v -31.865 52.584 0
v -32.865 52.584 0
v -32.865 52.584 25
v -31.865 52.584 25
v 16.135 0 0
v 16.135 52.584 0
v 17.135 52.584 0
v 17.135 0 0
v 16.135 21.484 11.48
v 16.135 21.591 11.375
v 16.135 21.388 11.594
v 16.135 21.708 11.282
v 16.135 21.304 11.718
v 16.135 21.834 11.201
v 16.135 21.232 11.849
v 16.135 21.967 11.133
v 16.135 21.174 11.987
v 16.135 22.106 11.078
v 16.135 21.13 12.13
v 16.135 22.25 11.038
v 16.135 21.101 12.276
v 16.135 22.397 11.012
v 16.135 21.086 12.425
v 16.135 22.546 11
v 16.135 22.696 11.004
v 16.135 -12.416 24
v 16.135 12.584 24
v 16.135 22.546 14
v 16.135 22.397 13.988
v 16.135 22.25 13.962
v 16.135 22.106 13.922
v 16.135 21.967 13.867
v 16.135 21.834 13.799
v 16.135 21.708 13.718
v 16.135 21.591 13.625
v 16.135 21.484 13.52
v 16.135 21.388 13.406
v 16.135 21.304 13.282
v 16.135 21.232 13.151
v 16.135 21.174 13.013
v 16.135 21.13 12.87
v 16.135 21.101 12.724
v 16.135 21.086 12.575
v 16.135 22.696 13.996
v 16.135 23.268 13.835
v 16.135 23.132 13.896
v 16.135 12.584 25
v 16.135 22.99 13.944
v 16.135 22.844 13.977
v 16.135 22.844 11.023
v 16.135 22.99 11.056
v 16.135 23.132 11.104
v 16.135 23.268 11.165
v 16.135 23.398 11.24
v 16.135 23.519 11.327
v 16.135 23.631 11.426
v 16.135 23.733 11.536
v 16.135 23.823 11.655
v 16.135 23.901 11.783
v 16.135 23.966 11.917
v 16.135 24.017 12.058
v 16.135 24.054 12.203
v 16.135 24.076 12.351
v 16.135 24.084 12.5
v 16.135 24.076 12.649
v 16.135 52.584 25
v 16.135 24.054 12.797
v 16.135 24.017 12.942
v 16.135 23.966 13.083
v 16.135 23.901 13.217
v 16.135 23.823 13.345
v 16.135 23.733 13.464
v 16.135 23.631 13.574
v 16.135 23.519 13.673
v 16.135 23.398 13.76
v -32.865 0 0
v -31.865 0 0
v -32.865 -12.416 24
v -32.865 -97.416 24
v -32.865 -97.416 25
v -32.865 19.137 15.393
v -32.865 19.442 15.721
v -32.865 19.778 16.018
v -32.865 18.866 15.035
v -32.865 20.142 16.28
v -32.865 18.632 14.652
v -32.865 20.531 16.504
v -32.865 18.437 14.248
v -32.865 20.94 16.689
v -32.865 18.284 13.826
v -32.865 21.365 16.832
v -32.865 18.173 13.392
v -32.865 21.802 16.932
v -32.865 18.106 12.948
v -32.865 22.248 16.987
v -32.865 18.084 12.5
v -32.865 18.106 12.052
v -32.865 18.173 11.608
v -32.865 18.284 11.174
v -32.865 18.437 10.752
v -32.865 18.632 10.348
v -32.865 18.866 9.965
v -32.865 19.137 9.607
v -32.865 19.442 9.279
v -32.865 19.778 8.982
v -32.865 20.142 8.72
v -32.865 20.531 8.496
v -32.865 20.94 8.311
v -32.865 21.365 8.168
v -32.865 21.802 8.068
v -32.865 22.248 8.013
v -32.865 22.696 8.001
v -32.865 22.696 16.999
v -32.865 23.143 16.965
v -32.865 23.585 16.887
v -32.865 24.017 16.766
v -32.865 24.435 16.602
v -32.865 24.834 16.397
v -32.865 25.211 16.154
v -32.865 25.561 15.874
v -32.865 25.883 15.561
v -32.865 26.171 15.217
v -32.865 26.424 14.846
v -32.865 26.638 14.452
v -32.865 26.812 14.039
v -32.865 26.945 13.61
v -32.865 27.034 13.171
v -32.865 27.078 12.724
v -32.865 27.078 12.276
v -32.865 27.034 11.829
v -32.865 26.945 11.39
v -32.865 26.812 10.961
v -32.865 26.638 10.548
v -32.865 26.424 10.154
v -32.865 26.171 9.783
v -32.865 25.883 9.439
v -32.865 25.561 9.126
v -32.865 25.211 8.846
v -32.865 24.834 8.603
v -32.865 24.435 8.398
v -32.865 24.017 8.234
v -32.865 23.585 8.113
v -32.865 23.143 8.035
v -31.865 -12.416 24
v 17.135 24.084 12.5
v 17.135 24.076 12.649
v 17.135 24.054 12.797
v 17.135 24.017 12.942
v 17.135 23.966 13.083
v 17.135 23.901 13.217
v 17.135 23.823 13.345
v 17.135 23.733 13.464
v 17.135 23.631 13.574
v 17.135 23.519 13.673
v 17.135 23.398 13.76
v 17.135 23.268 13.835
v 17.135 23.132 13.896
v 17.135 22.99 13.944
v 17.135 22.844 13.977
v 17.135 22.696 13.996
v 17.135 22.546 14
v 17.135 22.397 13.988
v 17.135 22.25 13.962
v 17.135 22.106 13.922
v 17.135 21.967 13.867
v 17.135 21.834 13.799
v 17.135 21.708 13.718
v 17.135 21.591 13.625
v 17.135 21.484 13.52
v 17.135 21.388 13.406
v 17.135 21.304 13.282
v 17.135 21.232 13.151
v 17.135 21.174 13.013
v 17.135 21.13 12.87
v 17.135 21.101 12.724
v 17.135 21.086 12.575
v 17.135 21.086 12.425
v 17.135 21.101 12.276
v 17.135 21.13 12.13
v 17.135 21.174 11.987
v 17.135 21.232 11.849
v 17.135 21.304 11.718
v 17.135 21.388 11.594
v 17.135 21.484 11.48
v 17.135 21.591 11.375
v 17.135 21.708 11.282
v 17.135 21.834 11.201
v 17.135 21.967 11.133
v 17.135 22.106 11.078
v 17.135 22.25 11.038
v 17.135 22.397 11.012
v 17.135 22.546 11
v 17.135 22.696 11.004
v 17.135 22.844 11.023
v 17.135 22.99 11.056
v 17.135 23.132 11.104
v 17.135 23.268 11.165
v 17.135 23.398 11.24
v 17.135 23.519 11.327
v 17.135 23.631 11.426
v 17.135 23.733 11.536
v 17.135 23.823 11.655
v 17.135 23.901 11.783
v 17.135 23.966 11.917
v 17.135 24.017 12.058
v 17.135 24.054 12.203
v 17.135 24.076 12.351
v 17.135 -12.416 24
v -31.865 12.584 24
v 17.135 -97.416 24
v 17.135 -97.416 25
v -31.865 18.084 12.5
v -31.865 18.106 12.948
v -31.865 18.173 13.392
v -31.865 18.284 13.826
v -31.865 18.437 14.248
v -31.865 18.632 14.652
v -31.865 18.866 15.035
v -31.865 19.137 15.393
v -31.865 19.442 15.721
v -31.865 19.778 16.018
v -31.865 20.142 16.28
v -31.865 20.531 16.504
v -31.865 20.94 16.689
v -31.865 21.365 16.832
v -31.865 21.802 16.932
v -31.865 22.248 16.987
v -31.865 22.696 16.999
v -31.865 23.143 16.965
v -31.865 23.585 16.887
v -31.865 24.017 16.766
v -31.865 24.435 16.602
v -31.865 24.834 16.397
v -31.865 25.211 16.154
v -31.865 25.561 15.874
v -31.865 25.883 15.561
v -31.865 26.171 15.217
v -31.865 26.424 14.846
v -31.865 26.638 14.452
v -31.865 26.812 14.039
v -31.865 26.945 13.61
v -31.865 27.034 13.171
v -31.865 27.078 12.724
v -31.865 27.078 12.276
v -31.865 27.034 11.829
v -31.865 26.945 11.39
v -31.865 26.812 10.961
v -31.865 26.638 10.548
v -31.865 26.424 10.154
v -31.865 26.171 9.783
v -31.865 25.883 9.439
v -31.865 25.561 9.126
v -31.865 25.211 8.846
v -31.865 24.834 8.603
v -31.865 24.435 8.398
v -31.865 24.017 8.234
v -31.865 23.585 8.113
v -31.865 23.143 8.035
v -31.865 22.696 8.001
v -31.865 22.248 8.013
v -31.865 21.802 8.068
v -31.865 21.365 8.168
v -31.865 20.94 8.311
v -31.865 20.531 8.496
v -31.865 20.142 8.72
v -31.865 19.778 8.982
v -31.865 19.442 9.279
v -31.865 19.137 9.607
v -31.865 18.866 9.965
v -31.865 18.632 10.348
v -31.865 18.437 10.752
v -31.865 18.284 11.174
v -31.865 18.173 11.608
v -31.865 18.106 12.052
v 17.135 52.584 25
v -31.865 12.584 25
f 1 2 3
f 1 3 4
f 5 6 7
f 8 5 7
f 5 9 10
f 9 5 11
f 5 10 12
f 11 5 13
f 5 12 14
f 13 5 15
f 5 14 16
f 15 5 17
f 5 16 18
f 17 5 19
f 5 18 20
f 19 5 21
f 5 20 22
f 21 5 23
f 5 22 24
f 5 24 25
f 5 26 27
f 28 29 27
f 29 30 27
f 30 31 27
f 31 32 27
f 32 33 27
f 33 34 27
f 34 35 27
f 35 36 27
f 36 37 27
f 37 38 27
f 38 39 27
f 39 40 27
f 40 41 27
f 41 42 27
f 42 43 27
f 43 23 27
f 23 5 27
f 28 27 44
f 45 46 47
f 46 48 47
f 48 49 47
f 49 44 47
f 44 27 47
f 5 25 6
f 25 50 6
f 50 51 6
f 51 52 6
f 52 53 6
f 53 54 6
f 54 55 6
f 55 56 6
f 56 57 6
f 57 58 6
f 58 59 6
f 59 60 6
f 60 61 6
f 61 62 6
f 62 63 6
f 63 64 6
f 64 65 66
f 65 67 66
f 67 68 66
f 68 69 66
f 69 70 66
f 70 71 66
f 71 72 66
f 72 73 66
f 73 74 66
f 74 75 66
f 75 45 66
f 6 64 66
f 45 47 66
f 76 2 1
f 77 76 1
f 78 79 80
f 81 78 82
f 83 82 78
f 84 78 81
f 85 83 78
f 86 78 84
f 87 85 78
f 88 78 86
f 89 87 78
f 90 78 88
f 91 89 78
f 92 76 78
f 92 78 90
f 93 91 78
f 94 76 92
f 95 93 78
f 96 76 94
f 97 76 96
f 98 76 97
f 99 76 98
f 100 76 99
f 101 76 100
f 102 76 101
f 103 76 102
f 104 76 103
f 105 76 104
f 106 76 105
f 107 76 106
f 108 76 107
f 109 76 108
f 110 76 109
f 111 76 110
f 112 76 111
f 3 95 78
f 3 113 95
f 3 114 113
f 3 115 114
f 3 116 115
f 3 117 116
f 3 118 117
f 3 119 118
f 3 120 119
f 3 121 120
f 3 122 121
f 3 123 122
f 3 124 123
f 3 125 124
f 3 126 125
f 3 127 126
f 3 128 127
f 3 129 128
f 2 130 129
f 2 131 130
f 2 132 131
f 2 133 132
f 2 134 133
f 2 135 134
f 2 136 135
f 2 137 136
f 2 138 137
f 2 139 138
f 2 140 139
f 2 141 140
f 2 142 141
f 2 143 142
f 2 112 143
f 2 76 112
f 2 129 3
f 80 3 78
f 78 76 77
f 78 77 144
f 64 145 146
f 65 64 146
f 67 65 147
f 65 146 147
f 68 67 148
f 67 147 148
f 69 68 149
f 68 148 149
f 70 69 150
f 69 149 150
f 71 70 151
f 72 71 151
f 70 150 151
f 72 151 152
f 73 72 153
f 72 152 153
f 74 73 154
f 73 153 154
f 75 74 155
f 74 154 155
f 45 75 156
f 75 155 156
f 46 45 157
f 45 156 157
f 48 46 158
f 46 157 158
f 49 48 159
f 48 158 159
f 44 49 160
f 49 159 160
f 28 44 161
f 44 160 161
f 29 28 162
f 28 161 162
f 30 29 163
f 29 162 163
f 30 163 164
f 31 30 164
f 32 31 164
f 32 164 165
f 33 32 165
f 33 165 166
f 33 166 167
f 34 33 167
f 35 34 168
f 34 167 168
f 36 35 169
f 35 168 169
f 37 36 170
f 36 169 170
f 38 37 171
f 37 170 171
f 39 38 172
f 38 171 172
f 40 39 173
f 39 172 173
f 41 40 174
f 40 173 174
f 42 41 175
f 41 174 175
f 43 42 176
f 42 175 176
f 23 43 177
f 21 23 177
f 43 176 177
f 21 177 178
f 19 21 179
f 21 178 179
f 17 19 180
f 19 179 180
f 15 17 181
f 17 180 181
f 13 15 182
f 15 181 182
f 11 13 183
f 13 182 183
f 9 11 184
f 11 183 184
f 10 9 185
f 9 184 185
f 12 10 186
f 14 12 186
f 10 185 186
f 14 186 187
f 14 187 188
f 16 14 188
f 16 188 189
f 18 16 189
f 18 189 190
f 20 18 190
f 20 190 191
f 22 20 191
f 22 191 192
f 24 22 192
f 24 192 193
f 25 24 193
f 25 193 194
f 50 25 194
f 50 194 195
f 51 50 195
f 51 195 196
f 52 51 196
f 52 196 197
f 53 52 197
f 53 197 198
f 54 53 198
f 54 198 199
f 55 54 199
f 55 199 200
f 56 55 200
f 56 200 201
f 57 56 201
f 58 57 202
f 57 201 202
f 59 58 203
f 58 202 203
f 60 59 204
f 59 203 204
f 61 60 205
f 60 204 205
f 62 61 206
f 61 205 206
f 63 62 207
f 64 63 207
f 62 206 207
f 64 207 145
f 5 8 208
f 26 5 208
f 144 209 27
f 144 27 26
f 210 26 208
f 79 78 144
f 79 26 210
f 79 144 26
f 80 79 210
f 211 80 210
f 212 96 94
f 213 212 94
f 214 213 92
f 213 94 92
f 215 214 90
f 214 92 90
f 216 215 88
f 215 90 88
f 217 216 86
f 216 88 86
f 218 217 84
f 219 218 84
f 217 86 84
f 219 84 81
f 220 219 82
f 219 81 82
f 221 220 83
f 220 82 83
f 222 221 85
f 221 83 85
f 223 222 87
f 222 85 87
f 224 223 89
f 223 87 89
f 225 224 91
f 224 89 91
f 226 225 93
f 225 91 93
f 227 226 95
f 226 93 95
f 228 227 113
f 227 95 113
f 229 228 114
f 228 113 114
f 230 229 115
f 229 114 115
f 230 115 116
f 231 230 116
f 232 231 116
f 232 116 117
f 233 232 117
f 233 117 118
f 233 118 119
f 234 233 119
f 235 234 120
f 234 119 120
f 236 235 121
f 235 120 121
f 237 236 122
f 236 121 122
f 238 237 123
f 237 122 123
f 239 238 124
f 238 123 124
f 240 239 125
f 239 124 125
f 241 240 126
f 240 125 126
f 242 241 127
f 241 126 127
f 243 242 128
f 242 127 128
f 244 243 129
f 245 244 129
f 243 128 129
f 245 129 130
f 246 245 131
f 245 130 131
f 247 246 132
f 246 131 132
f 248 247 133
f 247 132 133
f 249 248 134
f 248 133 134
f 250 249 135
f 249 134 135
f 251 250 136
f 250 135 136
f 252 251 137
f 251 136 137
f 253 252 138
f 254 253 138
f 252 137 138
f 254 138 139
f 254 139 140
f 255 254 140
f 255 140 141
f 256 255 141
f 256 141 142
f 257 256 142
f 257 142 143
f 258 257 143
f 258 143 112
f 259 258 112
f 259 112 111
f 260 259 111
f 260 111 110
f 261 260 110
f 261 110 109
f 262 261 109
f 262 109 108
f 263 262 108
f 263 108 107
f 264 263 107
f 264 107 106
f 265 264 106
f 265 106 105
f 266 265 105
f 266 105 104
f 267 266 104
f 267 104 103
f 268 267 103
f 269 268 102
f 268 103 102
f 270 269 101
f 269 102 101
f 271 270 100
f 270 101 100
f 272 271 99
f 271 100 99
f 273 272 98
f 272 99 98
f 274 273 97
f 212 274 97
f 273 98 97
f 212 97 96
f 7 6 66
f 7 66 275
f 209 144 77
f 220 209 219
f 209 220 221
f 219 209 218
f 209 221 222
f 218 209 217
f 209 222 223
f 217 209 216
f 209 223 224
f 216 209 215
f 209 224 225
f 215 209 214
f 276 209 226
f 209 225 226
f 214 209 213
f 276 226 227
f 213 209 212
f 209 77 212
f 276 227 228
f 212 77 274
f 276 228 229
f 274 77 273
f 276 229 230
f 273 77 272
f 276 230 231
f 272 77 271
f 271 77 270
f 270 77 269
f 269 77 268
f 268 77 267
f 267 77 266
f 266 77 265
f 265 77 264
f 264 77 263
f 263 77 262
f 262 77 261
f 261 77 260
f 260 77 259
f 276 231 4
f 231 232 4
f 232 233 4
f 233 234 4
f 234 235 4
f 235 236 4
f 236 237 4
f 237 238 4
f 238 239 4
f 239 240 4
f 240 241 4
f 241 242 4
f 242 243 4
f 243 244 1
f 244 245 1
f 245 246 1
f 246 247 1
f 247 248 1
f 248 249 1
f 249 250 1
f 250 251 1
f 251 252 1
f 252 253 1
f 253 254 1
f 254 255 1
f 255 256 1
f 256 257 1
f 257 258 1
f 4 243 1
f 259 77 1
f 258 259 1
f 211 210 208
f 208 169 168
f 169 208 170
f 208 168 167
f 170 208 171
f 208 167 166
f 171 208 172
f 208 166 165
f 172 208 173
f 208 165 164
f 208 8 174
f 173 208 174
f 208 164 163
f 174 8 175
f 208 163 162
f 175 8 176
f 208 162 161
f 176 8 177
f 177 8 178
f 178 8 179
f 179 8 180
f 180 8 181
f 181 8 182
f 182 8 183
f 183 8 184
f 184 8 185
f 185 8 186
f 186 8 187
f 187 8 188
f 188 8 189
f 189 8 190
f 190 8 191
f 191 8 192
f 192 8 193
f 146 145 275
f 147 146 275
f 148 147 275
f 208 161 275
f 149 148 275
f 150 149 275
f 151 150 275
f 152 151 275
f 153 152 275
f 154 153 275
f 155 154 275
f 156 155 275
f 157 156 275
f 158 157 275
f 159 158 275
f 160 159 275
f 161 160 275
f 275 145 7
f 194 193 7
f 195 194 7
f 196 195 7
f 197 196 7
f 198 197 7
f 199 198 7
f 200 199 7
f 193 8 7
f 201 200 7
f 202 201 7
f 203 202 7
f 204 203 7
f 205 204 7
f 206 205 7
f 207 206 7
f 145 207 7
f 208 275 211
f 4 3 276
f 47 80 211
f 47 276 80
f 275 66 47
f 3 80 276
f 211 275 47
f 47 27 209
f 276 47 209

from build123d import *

# Parameters (mm, degrees)
CROQUIS2_W              = 50
CROQUIS2_H              = 150
SALIENTE_EXTRUIR1_DEPTH = 25
CROQUIS6_W              = 48
CROQUIS6_H              = 40
CORTAR_EXTRUIR1_DEPTH   = 25
VACIADO2_START          = -31.864905155
VACIADO2_OUTLINE_W      = 110
VACIADO2_OUTLINE_H      = 23
VACIADO2_DEPTH          = 48
CROQUIS8_R              = 4.5
CORTAR_EXTRUIR3_DEPTH   = 1
CROQUIS9_W              = 48
CROQUIS9_H              = 110
CORTAR_EXTRUIR4_DEPTH   = 10
CORTAR_EXTRUIR5_DEPTH   = 1
CORTAR_EXTRUIR6_DEPTH   = 1
CROQUIS12_R             = 1.5
CORTAR_EXTRUIR7_DEPTH   = 1


# Read off the part's stored shape, not the designer's step: Vaciado2
with BuildPart() as part:
    # Croquis2 → Saliente-Extruir1 (new body)
    with BuildSketch(Plane.XY):
        with Locations((-7.864905155, -22.416151752)):
            Rectangle(CROQUIS2_W, CROQUIS2_H)
    extrude(amount=SALIENTE_EXTRUIR1_DEPTH)

    # Croquis6 → Cortar-Extruir1 (cut)
    with BuildSketch(Plane(origin=(0, 0, 0), x_dir=(-1, 0, 0), z_dir=(0, 0, -1))):
        with Locations((7.864905155, 32.583848248)):
            Rectangle(CROQUIS6_W, CROQUIS6_H)
    extrude(amount=-CORTAR_EXTRUIR1_DEPTH, mode=Mode.SUBTRACT)

    # Vaciado2 outline → Vaciado2 (cut)
    with BuildSketch(Plane.YZ.offset(VACIADO2_START)):
        with Locations((-42.416151752, 12.5)):
            Rectangle(VACIADO2_OUTLINE_W, VACIADO2_OUTLINE_H)
    extrude(amount=VACIADO2_DEPTH, mode=Mode.SUBTRACT)

    # Croquis8 → Cortar-Extruir3 (cut)
    with BuildSketch(Plane.ZY.offset(32.864905155)):
        with Locations(Location((12.5, 22.583848248, 0), (0, 0, 270))):
            Circle(CROQUIS8_R)
    extrude(amount=-CORTAR_EXTRUIR3_DEPTH, mode=Mode.SUBTRACT)

    # Croquis9 → Cortar-Extruir4 (cut)
    with BuildSketch(Plane(origin=(0, 0, 0), x_dir=(-1, 0, 0), z_dir=(0, 0, -1))):
        with Locations((7.864905155, -42.416151752)):
            Rectangle(CROQUIS9_W, CROQUIS9_H)
    extrude(amount=-CORTAR_EXTRUIR4_DEPTH, mode=Mode.SUBTRACT)

    # Croquis10 → Cortar-Extruir5 (cut)
    with BuildSketch(Plane.ZY.offset(32.864905155)):
        Polygon((0, 0), (24, -12.416151752), (24, -97.416151752), (0, -97.416151752), align=None)
    extrude(amount=-CORTAR_EXTRUIR5_DEPTH, mode=Mode.SUBTRACT)

    # Croquis11 → Cortar-Extruir6 (cut)
    with BuildSketch(Plane(origin=(17.135094845, 0, 0), x_dir=(0, 0, -1), z_dir=(1, 0, 0))):
        Polygon((0, 0), (-24, -12.416151752), (-24, -97.416151752), (0, -97.416151752), align=None)
    extrude(amount=-CORTAR_EXTRUIR6_DEPTH, mode=Mode.SUBTRACT)

    # Croquis12 → Cortar-Extruir7 (cut)
    with BuildSketch(Plane(origin=(17.135094845, 0, 0), x_dir=(0, 0, -1), z_dir=(1, 0, 0))):
        with Locations(Location((-12.5, 22.583848248, 0), (0, 0, 90))):
            Circle(CROQUIS12_R)
    extrude(amount=-CORTAR_EXTRUIR7_DEPTH, mode=Mode.SUBTRACT)


solid = part.part
